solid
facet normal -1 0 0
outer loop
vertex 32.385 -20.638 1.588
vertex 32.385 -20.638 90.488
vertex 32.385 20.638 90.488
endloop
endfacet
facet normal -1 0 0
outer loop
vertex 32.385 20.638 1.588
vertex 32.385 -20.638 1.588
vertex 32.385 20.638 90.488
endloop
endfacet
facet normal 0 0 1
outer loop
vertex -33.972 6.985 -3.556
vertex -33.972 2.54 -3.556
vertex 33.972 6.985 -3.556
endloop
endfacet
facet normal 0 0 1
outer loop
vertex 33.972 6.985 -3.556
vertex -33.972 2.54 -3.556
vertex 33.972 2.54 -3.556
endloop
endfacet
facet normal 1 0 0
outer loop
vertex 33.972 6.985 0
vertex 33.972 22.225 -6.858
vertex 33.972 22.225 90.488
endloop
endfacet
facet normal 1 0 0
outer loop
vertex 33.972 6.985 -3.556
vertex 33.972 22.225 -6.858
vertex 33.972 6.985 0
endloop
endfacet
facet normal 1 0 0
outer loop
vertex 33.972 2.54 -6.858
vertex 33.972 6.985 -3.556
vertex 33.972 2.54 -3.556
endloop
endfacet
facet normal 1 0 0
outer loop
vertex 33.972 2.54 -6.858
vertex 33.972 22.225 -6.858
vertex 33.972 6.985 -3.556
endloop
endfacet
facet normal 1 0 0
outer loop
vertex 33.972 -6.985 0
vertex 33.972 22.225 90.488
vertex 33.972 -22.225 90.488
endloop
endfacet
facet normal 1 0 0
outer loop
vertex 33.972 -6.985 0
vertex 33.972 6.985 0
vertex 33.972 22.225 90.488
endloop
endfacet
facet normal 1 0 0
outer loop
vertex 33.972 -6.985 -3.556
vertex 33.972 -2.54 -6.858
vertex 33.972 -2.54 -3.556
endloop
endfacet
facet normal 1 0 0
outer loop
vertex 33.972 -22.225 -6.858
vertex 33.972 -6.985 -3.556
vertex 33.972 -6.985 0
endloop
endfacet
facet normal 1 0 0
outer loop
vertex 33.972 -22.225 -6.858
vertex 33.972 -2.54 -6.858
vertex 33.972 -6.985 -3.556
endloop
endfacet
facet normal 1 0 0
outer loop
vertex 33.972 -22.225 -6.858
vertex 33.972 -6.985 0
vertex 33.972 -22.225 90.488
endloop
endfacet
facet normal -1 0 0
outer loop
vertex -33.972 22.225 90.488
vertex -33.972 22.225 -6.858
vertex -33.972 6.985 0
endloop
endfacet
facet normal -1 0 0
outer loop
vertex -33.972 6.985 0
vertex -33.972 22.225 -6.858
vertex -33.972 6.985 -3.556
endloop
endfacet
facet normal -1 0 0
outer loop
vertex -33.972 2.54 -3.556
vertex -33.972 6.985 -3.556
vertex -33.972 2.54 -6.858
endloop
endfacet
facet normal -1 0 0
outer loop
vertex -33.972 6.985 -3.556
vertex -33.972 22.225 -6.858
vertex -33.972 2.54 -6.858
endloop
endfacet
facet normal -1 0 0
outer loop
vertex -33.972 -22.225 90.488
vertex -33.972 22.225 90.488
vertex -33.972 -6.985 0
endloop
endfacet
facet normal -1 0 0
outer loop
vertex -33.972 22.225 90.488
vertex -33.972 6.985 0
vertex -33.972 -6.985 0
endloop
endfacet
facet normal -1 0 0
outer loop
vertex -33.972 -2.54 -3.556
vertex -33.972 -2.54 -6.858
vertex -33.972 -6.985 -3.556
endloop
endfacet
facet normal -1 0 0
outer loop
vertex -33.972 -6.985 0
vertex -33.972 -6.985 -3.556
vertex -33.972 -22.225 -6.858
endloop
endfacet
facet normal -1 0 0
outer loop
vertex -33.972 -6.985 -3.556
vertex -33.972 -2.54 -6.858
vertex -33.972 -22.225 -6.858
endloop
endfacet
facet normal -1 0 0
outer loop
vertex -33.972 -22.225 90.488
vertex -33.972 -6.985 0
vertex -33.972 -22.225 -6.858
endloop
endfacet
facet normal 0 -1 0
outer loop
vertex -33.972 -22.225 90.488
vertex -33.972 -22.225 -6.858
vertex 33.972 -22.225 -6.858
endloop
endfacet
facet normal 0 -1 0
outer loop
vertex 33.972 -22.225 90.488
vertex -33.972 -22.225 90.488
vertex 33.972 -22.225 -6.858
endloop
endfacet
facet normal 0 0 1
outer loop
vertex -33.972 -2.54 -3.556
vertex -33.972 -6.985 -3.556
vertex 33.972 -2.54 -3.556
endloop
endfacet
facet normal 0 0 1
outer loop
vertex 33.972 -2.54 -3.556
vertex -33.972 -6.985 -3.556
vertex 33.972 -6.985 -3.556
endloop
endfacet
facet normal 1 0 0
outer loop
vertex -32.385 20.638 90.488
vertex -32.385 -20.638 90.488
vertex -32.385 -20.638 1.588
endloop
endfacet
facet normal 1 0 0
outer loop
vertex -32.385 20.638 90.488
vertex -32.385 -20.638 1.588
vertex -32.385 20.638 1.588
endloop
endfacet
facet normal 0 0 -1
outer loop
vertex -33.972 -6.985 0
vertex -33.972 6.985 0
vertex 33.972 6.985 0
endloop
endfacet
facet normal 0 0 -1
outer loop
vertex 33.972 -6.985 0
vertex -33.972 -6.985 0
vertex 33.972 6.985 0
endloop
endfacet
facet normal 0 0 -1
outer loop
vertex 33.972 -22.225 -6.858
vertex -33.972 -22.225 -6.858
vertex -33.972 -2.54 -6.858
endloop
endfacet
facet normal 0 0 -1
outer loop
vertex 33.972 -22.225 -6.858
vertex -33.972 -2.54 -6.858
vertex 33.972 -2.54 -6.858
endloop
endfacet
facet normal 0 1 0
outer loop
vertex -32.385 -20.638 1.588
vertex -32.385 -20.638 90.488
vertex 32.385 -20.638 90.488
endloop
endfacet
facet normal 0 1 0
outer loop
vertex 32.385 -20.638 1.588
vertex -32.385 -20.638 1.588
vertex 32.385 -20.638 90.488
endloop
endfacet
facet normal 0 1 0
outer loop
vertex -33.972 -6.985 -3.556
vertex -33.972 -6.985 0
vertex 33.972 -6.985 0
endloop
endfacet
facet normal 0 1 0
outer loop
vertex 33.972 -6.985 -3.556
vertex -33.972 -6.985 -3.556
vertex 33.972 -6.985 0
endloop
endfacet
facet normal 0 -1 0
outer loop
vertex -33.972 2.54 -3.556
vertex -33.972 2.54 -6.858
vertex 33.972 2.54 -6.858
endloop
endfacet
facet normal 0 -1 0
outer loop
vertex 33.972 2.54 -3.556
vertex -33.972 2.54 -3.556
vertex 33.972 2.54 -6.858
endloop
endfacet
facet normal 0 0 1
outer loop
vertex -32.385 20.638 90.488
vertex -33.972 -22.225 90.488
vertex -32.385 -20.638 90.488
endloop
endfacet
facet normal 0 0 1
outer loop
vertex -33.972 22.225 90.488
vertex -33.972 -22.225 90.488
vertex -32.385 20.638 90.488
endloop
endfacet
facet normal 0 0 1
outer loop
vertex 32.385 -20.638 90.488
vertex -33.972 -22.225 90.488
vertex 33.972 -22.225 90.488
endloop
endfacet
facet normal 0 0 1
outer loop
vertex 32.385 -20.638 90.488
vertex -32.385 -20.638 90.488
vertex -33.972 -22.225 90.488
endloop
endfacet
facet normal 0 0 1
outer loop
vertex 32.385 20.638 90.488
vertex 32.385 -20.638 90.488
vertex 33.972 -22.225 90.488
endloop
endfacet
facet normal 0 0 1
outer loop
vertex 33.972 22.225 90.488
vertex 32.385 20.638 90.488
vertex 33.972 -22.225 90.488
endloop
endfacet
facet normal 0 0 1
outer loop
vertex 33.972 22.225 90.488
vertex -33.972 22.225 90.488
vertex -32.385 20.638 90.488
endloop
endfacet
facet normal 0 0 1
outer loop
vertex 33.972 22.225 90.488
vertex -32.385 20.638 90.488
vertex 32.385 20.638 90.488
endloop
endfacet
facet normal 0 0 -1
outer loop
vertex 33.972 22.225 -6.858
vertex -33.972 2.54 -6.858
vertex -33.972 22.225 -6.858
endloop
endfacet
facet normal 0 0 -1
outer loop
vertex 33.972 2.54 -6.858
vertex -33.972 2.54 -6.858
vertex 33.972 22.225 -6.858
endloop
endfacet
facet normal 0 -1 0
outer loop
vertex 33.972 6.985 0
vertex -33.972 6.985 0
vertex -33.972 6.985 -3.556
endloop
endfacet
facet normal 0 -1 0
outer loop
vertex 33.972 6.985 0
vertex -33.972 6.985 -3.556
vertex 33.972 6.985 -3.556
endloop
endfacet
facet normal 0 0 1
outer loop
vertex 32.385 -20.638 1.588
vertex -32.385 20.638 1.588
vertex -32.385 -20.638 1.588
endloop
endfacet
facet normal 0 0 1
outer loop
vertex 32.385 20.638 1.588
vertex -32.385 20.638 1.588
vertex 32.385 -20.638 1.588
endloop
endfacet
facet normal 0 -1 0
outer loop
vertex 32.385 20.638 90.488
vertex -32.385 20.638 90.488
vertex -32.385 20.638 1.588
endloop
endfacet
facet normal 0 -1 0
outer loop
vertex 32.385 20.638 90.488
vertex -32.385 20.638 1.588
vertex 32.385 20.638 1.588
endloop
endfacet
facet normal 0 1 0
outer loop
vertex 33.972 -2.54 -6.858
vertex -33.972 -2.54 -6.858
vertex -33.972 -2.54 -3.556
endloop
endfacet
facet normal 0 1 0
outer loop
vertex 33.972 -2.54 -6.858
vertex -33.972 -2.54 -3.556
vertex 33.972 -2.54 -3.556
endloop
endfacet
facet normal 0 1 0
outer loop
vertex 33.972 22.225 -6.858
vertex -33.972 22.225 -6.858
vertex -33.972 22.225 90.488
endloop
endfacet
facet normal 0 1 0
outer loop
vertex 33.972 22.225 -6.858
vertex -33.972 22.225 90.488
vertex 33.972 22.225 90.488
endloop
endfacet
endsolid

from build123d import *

# Parameters (mm, degrees)
F0_W     = 67.945
F0_H     = 44.45
F1_DEPTH = 1.5875
F2_W     = 67.945
F2_H     = 44.45
F2_W_2   = 64.77
F2_H_2   = 41.275
F3_DEPTH = 88.9
F4_W     = 67.945
F4_H     = 15.24
F5_DEPTH = 6.858
F6_W     = 67.945
F6_H     = 4.445
F7_DEPTH = 3.302


with BuildPart() as f1:
    # F0 (on Top) → F1 (new body)
    with BuildSketch(Plane.XY):
        Rectangle(F0_W, F0_H)
    extrude(amount=F1_DEPTH)

    # F2 (on face) → F3 (join)
    with BuildSketch(Plane.XY.offset(1.5875)):
        Rectangle(F2_W, F2_H)
        Rectangle(F2_W_2, F2_H_2, mode=Mode.SUBTRACT)
    extrude(amount=F3_DEPTH)

    # F4 (on face) → F5 (join)
    with BuildSketch(Plane(origin=(0, 0, 0), x_dir=(1, 0, 0), z_dir=(0, 0, -1))):
        with Locations((0, 14.605)):
            Rectangle(F4_W, F4_H)
        with Locations((0, -14.605)):
            Rectangle(F4_W, F4_H)
    extrude(amount=F5_DEPTH)

    # F6 (on face) → F7 (join)
    with BuildSketch(Plane(origin=(0, 0, -6.858), x_dir=(1, 0, 0), z_dir=(0, 0, -1))):
        with Locations((0, 4.7625)):
            Rectangle(F6_W, F6_H)
        with Locations((0, -4.7625)):
            Rectangle(F6_W, F6_H)
    extrude(amount=-F7_DEPTH)


solid = f1.part
